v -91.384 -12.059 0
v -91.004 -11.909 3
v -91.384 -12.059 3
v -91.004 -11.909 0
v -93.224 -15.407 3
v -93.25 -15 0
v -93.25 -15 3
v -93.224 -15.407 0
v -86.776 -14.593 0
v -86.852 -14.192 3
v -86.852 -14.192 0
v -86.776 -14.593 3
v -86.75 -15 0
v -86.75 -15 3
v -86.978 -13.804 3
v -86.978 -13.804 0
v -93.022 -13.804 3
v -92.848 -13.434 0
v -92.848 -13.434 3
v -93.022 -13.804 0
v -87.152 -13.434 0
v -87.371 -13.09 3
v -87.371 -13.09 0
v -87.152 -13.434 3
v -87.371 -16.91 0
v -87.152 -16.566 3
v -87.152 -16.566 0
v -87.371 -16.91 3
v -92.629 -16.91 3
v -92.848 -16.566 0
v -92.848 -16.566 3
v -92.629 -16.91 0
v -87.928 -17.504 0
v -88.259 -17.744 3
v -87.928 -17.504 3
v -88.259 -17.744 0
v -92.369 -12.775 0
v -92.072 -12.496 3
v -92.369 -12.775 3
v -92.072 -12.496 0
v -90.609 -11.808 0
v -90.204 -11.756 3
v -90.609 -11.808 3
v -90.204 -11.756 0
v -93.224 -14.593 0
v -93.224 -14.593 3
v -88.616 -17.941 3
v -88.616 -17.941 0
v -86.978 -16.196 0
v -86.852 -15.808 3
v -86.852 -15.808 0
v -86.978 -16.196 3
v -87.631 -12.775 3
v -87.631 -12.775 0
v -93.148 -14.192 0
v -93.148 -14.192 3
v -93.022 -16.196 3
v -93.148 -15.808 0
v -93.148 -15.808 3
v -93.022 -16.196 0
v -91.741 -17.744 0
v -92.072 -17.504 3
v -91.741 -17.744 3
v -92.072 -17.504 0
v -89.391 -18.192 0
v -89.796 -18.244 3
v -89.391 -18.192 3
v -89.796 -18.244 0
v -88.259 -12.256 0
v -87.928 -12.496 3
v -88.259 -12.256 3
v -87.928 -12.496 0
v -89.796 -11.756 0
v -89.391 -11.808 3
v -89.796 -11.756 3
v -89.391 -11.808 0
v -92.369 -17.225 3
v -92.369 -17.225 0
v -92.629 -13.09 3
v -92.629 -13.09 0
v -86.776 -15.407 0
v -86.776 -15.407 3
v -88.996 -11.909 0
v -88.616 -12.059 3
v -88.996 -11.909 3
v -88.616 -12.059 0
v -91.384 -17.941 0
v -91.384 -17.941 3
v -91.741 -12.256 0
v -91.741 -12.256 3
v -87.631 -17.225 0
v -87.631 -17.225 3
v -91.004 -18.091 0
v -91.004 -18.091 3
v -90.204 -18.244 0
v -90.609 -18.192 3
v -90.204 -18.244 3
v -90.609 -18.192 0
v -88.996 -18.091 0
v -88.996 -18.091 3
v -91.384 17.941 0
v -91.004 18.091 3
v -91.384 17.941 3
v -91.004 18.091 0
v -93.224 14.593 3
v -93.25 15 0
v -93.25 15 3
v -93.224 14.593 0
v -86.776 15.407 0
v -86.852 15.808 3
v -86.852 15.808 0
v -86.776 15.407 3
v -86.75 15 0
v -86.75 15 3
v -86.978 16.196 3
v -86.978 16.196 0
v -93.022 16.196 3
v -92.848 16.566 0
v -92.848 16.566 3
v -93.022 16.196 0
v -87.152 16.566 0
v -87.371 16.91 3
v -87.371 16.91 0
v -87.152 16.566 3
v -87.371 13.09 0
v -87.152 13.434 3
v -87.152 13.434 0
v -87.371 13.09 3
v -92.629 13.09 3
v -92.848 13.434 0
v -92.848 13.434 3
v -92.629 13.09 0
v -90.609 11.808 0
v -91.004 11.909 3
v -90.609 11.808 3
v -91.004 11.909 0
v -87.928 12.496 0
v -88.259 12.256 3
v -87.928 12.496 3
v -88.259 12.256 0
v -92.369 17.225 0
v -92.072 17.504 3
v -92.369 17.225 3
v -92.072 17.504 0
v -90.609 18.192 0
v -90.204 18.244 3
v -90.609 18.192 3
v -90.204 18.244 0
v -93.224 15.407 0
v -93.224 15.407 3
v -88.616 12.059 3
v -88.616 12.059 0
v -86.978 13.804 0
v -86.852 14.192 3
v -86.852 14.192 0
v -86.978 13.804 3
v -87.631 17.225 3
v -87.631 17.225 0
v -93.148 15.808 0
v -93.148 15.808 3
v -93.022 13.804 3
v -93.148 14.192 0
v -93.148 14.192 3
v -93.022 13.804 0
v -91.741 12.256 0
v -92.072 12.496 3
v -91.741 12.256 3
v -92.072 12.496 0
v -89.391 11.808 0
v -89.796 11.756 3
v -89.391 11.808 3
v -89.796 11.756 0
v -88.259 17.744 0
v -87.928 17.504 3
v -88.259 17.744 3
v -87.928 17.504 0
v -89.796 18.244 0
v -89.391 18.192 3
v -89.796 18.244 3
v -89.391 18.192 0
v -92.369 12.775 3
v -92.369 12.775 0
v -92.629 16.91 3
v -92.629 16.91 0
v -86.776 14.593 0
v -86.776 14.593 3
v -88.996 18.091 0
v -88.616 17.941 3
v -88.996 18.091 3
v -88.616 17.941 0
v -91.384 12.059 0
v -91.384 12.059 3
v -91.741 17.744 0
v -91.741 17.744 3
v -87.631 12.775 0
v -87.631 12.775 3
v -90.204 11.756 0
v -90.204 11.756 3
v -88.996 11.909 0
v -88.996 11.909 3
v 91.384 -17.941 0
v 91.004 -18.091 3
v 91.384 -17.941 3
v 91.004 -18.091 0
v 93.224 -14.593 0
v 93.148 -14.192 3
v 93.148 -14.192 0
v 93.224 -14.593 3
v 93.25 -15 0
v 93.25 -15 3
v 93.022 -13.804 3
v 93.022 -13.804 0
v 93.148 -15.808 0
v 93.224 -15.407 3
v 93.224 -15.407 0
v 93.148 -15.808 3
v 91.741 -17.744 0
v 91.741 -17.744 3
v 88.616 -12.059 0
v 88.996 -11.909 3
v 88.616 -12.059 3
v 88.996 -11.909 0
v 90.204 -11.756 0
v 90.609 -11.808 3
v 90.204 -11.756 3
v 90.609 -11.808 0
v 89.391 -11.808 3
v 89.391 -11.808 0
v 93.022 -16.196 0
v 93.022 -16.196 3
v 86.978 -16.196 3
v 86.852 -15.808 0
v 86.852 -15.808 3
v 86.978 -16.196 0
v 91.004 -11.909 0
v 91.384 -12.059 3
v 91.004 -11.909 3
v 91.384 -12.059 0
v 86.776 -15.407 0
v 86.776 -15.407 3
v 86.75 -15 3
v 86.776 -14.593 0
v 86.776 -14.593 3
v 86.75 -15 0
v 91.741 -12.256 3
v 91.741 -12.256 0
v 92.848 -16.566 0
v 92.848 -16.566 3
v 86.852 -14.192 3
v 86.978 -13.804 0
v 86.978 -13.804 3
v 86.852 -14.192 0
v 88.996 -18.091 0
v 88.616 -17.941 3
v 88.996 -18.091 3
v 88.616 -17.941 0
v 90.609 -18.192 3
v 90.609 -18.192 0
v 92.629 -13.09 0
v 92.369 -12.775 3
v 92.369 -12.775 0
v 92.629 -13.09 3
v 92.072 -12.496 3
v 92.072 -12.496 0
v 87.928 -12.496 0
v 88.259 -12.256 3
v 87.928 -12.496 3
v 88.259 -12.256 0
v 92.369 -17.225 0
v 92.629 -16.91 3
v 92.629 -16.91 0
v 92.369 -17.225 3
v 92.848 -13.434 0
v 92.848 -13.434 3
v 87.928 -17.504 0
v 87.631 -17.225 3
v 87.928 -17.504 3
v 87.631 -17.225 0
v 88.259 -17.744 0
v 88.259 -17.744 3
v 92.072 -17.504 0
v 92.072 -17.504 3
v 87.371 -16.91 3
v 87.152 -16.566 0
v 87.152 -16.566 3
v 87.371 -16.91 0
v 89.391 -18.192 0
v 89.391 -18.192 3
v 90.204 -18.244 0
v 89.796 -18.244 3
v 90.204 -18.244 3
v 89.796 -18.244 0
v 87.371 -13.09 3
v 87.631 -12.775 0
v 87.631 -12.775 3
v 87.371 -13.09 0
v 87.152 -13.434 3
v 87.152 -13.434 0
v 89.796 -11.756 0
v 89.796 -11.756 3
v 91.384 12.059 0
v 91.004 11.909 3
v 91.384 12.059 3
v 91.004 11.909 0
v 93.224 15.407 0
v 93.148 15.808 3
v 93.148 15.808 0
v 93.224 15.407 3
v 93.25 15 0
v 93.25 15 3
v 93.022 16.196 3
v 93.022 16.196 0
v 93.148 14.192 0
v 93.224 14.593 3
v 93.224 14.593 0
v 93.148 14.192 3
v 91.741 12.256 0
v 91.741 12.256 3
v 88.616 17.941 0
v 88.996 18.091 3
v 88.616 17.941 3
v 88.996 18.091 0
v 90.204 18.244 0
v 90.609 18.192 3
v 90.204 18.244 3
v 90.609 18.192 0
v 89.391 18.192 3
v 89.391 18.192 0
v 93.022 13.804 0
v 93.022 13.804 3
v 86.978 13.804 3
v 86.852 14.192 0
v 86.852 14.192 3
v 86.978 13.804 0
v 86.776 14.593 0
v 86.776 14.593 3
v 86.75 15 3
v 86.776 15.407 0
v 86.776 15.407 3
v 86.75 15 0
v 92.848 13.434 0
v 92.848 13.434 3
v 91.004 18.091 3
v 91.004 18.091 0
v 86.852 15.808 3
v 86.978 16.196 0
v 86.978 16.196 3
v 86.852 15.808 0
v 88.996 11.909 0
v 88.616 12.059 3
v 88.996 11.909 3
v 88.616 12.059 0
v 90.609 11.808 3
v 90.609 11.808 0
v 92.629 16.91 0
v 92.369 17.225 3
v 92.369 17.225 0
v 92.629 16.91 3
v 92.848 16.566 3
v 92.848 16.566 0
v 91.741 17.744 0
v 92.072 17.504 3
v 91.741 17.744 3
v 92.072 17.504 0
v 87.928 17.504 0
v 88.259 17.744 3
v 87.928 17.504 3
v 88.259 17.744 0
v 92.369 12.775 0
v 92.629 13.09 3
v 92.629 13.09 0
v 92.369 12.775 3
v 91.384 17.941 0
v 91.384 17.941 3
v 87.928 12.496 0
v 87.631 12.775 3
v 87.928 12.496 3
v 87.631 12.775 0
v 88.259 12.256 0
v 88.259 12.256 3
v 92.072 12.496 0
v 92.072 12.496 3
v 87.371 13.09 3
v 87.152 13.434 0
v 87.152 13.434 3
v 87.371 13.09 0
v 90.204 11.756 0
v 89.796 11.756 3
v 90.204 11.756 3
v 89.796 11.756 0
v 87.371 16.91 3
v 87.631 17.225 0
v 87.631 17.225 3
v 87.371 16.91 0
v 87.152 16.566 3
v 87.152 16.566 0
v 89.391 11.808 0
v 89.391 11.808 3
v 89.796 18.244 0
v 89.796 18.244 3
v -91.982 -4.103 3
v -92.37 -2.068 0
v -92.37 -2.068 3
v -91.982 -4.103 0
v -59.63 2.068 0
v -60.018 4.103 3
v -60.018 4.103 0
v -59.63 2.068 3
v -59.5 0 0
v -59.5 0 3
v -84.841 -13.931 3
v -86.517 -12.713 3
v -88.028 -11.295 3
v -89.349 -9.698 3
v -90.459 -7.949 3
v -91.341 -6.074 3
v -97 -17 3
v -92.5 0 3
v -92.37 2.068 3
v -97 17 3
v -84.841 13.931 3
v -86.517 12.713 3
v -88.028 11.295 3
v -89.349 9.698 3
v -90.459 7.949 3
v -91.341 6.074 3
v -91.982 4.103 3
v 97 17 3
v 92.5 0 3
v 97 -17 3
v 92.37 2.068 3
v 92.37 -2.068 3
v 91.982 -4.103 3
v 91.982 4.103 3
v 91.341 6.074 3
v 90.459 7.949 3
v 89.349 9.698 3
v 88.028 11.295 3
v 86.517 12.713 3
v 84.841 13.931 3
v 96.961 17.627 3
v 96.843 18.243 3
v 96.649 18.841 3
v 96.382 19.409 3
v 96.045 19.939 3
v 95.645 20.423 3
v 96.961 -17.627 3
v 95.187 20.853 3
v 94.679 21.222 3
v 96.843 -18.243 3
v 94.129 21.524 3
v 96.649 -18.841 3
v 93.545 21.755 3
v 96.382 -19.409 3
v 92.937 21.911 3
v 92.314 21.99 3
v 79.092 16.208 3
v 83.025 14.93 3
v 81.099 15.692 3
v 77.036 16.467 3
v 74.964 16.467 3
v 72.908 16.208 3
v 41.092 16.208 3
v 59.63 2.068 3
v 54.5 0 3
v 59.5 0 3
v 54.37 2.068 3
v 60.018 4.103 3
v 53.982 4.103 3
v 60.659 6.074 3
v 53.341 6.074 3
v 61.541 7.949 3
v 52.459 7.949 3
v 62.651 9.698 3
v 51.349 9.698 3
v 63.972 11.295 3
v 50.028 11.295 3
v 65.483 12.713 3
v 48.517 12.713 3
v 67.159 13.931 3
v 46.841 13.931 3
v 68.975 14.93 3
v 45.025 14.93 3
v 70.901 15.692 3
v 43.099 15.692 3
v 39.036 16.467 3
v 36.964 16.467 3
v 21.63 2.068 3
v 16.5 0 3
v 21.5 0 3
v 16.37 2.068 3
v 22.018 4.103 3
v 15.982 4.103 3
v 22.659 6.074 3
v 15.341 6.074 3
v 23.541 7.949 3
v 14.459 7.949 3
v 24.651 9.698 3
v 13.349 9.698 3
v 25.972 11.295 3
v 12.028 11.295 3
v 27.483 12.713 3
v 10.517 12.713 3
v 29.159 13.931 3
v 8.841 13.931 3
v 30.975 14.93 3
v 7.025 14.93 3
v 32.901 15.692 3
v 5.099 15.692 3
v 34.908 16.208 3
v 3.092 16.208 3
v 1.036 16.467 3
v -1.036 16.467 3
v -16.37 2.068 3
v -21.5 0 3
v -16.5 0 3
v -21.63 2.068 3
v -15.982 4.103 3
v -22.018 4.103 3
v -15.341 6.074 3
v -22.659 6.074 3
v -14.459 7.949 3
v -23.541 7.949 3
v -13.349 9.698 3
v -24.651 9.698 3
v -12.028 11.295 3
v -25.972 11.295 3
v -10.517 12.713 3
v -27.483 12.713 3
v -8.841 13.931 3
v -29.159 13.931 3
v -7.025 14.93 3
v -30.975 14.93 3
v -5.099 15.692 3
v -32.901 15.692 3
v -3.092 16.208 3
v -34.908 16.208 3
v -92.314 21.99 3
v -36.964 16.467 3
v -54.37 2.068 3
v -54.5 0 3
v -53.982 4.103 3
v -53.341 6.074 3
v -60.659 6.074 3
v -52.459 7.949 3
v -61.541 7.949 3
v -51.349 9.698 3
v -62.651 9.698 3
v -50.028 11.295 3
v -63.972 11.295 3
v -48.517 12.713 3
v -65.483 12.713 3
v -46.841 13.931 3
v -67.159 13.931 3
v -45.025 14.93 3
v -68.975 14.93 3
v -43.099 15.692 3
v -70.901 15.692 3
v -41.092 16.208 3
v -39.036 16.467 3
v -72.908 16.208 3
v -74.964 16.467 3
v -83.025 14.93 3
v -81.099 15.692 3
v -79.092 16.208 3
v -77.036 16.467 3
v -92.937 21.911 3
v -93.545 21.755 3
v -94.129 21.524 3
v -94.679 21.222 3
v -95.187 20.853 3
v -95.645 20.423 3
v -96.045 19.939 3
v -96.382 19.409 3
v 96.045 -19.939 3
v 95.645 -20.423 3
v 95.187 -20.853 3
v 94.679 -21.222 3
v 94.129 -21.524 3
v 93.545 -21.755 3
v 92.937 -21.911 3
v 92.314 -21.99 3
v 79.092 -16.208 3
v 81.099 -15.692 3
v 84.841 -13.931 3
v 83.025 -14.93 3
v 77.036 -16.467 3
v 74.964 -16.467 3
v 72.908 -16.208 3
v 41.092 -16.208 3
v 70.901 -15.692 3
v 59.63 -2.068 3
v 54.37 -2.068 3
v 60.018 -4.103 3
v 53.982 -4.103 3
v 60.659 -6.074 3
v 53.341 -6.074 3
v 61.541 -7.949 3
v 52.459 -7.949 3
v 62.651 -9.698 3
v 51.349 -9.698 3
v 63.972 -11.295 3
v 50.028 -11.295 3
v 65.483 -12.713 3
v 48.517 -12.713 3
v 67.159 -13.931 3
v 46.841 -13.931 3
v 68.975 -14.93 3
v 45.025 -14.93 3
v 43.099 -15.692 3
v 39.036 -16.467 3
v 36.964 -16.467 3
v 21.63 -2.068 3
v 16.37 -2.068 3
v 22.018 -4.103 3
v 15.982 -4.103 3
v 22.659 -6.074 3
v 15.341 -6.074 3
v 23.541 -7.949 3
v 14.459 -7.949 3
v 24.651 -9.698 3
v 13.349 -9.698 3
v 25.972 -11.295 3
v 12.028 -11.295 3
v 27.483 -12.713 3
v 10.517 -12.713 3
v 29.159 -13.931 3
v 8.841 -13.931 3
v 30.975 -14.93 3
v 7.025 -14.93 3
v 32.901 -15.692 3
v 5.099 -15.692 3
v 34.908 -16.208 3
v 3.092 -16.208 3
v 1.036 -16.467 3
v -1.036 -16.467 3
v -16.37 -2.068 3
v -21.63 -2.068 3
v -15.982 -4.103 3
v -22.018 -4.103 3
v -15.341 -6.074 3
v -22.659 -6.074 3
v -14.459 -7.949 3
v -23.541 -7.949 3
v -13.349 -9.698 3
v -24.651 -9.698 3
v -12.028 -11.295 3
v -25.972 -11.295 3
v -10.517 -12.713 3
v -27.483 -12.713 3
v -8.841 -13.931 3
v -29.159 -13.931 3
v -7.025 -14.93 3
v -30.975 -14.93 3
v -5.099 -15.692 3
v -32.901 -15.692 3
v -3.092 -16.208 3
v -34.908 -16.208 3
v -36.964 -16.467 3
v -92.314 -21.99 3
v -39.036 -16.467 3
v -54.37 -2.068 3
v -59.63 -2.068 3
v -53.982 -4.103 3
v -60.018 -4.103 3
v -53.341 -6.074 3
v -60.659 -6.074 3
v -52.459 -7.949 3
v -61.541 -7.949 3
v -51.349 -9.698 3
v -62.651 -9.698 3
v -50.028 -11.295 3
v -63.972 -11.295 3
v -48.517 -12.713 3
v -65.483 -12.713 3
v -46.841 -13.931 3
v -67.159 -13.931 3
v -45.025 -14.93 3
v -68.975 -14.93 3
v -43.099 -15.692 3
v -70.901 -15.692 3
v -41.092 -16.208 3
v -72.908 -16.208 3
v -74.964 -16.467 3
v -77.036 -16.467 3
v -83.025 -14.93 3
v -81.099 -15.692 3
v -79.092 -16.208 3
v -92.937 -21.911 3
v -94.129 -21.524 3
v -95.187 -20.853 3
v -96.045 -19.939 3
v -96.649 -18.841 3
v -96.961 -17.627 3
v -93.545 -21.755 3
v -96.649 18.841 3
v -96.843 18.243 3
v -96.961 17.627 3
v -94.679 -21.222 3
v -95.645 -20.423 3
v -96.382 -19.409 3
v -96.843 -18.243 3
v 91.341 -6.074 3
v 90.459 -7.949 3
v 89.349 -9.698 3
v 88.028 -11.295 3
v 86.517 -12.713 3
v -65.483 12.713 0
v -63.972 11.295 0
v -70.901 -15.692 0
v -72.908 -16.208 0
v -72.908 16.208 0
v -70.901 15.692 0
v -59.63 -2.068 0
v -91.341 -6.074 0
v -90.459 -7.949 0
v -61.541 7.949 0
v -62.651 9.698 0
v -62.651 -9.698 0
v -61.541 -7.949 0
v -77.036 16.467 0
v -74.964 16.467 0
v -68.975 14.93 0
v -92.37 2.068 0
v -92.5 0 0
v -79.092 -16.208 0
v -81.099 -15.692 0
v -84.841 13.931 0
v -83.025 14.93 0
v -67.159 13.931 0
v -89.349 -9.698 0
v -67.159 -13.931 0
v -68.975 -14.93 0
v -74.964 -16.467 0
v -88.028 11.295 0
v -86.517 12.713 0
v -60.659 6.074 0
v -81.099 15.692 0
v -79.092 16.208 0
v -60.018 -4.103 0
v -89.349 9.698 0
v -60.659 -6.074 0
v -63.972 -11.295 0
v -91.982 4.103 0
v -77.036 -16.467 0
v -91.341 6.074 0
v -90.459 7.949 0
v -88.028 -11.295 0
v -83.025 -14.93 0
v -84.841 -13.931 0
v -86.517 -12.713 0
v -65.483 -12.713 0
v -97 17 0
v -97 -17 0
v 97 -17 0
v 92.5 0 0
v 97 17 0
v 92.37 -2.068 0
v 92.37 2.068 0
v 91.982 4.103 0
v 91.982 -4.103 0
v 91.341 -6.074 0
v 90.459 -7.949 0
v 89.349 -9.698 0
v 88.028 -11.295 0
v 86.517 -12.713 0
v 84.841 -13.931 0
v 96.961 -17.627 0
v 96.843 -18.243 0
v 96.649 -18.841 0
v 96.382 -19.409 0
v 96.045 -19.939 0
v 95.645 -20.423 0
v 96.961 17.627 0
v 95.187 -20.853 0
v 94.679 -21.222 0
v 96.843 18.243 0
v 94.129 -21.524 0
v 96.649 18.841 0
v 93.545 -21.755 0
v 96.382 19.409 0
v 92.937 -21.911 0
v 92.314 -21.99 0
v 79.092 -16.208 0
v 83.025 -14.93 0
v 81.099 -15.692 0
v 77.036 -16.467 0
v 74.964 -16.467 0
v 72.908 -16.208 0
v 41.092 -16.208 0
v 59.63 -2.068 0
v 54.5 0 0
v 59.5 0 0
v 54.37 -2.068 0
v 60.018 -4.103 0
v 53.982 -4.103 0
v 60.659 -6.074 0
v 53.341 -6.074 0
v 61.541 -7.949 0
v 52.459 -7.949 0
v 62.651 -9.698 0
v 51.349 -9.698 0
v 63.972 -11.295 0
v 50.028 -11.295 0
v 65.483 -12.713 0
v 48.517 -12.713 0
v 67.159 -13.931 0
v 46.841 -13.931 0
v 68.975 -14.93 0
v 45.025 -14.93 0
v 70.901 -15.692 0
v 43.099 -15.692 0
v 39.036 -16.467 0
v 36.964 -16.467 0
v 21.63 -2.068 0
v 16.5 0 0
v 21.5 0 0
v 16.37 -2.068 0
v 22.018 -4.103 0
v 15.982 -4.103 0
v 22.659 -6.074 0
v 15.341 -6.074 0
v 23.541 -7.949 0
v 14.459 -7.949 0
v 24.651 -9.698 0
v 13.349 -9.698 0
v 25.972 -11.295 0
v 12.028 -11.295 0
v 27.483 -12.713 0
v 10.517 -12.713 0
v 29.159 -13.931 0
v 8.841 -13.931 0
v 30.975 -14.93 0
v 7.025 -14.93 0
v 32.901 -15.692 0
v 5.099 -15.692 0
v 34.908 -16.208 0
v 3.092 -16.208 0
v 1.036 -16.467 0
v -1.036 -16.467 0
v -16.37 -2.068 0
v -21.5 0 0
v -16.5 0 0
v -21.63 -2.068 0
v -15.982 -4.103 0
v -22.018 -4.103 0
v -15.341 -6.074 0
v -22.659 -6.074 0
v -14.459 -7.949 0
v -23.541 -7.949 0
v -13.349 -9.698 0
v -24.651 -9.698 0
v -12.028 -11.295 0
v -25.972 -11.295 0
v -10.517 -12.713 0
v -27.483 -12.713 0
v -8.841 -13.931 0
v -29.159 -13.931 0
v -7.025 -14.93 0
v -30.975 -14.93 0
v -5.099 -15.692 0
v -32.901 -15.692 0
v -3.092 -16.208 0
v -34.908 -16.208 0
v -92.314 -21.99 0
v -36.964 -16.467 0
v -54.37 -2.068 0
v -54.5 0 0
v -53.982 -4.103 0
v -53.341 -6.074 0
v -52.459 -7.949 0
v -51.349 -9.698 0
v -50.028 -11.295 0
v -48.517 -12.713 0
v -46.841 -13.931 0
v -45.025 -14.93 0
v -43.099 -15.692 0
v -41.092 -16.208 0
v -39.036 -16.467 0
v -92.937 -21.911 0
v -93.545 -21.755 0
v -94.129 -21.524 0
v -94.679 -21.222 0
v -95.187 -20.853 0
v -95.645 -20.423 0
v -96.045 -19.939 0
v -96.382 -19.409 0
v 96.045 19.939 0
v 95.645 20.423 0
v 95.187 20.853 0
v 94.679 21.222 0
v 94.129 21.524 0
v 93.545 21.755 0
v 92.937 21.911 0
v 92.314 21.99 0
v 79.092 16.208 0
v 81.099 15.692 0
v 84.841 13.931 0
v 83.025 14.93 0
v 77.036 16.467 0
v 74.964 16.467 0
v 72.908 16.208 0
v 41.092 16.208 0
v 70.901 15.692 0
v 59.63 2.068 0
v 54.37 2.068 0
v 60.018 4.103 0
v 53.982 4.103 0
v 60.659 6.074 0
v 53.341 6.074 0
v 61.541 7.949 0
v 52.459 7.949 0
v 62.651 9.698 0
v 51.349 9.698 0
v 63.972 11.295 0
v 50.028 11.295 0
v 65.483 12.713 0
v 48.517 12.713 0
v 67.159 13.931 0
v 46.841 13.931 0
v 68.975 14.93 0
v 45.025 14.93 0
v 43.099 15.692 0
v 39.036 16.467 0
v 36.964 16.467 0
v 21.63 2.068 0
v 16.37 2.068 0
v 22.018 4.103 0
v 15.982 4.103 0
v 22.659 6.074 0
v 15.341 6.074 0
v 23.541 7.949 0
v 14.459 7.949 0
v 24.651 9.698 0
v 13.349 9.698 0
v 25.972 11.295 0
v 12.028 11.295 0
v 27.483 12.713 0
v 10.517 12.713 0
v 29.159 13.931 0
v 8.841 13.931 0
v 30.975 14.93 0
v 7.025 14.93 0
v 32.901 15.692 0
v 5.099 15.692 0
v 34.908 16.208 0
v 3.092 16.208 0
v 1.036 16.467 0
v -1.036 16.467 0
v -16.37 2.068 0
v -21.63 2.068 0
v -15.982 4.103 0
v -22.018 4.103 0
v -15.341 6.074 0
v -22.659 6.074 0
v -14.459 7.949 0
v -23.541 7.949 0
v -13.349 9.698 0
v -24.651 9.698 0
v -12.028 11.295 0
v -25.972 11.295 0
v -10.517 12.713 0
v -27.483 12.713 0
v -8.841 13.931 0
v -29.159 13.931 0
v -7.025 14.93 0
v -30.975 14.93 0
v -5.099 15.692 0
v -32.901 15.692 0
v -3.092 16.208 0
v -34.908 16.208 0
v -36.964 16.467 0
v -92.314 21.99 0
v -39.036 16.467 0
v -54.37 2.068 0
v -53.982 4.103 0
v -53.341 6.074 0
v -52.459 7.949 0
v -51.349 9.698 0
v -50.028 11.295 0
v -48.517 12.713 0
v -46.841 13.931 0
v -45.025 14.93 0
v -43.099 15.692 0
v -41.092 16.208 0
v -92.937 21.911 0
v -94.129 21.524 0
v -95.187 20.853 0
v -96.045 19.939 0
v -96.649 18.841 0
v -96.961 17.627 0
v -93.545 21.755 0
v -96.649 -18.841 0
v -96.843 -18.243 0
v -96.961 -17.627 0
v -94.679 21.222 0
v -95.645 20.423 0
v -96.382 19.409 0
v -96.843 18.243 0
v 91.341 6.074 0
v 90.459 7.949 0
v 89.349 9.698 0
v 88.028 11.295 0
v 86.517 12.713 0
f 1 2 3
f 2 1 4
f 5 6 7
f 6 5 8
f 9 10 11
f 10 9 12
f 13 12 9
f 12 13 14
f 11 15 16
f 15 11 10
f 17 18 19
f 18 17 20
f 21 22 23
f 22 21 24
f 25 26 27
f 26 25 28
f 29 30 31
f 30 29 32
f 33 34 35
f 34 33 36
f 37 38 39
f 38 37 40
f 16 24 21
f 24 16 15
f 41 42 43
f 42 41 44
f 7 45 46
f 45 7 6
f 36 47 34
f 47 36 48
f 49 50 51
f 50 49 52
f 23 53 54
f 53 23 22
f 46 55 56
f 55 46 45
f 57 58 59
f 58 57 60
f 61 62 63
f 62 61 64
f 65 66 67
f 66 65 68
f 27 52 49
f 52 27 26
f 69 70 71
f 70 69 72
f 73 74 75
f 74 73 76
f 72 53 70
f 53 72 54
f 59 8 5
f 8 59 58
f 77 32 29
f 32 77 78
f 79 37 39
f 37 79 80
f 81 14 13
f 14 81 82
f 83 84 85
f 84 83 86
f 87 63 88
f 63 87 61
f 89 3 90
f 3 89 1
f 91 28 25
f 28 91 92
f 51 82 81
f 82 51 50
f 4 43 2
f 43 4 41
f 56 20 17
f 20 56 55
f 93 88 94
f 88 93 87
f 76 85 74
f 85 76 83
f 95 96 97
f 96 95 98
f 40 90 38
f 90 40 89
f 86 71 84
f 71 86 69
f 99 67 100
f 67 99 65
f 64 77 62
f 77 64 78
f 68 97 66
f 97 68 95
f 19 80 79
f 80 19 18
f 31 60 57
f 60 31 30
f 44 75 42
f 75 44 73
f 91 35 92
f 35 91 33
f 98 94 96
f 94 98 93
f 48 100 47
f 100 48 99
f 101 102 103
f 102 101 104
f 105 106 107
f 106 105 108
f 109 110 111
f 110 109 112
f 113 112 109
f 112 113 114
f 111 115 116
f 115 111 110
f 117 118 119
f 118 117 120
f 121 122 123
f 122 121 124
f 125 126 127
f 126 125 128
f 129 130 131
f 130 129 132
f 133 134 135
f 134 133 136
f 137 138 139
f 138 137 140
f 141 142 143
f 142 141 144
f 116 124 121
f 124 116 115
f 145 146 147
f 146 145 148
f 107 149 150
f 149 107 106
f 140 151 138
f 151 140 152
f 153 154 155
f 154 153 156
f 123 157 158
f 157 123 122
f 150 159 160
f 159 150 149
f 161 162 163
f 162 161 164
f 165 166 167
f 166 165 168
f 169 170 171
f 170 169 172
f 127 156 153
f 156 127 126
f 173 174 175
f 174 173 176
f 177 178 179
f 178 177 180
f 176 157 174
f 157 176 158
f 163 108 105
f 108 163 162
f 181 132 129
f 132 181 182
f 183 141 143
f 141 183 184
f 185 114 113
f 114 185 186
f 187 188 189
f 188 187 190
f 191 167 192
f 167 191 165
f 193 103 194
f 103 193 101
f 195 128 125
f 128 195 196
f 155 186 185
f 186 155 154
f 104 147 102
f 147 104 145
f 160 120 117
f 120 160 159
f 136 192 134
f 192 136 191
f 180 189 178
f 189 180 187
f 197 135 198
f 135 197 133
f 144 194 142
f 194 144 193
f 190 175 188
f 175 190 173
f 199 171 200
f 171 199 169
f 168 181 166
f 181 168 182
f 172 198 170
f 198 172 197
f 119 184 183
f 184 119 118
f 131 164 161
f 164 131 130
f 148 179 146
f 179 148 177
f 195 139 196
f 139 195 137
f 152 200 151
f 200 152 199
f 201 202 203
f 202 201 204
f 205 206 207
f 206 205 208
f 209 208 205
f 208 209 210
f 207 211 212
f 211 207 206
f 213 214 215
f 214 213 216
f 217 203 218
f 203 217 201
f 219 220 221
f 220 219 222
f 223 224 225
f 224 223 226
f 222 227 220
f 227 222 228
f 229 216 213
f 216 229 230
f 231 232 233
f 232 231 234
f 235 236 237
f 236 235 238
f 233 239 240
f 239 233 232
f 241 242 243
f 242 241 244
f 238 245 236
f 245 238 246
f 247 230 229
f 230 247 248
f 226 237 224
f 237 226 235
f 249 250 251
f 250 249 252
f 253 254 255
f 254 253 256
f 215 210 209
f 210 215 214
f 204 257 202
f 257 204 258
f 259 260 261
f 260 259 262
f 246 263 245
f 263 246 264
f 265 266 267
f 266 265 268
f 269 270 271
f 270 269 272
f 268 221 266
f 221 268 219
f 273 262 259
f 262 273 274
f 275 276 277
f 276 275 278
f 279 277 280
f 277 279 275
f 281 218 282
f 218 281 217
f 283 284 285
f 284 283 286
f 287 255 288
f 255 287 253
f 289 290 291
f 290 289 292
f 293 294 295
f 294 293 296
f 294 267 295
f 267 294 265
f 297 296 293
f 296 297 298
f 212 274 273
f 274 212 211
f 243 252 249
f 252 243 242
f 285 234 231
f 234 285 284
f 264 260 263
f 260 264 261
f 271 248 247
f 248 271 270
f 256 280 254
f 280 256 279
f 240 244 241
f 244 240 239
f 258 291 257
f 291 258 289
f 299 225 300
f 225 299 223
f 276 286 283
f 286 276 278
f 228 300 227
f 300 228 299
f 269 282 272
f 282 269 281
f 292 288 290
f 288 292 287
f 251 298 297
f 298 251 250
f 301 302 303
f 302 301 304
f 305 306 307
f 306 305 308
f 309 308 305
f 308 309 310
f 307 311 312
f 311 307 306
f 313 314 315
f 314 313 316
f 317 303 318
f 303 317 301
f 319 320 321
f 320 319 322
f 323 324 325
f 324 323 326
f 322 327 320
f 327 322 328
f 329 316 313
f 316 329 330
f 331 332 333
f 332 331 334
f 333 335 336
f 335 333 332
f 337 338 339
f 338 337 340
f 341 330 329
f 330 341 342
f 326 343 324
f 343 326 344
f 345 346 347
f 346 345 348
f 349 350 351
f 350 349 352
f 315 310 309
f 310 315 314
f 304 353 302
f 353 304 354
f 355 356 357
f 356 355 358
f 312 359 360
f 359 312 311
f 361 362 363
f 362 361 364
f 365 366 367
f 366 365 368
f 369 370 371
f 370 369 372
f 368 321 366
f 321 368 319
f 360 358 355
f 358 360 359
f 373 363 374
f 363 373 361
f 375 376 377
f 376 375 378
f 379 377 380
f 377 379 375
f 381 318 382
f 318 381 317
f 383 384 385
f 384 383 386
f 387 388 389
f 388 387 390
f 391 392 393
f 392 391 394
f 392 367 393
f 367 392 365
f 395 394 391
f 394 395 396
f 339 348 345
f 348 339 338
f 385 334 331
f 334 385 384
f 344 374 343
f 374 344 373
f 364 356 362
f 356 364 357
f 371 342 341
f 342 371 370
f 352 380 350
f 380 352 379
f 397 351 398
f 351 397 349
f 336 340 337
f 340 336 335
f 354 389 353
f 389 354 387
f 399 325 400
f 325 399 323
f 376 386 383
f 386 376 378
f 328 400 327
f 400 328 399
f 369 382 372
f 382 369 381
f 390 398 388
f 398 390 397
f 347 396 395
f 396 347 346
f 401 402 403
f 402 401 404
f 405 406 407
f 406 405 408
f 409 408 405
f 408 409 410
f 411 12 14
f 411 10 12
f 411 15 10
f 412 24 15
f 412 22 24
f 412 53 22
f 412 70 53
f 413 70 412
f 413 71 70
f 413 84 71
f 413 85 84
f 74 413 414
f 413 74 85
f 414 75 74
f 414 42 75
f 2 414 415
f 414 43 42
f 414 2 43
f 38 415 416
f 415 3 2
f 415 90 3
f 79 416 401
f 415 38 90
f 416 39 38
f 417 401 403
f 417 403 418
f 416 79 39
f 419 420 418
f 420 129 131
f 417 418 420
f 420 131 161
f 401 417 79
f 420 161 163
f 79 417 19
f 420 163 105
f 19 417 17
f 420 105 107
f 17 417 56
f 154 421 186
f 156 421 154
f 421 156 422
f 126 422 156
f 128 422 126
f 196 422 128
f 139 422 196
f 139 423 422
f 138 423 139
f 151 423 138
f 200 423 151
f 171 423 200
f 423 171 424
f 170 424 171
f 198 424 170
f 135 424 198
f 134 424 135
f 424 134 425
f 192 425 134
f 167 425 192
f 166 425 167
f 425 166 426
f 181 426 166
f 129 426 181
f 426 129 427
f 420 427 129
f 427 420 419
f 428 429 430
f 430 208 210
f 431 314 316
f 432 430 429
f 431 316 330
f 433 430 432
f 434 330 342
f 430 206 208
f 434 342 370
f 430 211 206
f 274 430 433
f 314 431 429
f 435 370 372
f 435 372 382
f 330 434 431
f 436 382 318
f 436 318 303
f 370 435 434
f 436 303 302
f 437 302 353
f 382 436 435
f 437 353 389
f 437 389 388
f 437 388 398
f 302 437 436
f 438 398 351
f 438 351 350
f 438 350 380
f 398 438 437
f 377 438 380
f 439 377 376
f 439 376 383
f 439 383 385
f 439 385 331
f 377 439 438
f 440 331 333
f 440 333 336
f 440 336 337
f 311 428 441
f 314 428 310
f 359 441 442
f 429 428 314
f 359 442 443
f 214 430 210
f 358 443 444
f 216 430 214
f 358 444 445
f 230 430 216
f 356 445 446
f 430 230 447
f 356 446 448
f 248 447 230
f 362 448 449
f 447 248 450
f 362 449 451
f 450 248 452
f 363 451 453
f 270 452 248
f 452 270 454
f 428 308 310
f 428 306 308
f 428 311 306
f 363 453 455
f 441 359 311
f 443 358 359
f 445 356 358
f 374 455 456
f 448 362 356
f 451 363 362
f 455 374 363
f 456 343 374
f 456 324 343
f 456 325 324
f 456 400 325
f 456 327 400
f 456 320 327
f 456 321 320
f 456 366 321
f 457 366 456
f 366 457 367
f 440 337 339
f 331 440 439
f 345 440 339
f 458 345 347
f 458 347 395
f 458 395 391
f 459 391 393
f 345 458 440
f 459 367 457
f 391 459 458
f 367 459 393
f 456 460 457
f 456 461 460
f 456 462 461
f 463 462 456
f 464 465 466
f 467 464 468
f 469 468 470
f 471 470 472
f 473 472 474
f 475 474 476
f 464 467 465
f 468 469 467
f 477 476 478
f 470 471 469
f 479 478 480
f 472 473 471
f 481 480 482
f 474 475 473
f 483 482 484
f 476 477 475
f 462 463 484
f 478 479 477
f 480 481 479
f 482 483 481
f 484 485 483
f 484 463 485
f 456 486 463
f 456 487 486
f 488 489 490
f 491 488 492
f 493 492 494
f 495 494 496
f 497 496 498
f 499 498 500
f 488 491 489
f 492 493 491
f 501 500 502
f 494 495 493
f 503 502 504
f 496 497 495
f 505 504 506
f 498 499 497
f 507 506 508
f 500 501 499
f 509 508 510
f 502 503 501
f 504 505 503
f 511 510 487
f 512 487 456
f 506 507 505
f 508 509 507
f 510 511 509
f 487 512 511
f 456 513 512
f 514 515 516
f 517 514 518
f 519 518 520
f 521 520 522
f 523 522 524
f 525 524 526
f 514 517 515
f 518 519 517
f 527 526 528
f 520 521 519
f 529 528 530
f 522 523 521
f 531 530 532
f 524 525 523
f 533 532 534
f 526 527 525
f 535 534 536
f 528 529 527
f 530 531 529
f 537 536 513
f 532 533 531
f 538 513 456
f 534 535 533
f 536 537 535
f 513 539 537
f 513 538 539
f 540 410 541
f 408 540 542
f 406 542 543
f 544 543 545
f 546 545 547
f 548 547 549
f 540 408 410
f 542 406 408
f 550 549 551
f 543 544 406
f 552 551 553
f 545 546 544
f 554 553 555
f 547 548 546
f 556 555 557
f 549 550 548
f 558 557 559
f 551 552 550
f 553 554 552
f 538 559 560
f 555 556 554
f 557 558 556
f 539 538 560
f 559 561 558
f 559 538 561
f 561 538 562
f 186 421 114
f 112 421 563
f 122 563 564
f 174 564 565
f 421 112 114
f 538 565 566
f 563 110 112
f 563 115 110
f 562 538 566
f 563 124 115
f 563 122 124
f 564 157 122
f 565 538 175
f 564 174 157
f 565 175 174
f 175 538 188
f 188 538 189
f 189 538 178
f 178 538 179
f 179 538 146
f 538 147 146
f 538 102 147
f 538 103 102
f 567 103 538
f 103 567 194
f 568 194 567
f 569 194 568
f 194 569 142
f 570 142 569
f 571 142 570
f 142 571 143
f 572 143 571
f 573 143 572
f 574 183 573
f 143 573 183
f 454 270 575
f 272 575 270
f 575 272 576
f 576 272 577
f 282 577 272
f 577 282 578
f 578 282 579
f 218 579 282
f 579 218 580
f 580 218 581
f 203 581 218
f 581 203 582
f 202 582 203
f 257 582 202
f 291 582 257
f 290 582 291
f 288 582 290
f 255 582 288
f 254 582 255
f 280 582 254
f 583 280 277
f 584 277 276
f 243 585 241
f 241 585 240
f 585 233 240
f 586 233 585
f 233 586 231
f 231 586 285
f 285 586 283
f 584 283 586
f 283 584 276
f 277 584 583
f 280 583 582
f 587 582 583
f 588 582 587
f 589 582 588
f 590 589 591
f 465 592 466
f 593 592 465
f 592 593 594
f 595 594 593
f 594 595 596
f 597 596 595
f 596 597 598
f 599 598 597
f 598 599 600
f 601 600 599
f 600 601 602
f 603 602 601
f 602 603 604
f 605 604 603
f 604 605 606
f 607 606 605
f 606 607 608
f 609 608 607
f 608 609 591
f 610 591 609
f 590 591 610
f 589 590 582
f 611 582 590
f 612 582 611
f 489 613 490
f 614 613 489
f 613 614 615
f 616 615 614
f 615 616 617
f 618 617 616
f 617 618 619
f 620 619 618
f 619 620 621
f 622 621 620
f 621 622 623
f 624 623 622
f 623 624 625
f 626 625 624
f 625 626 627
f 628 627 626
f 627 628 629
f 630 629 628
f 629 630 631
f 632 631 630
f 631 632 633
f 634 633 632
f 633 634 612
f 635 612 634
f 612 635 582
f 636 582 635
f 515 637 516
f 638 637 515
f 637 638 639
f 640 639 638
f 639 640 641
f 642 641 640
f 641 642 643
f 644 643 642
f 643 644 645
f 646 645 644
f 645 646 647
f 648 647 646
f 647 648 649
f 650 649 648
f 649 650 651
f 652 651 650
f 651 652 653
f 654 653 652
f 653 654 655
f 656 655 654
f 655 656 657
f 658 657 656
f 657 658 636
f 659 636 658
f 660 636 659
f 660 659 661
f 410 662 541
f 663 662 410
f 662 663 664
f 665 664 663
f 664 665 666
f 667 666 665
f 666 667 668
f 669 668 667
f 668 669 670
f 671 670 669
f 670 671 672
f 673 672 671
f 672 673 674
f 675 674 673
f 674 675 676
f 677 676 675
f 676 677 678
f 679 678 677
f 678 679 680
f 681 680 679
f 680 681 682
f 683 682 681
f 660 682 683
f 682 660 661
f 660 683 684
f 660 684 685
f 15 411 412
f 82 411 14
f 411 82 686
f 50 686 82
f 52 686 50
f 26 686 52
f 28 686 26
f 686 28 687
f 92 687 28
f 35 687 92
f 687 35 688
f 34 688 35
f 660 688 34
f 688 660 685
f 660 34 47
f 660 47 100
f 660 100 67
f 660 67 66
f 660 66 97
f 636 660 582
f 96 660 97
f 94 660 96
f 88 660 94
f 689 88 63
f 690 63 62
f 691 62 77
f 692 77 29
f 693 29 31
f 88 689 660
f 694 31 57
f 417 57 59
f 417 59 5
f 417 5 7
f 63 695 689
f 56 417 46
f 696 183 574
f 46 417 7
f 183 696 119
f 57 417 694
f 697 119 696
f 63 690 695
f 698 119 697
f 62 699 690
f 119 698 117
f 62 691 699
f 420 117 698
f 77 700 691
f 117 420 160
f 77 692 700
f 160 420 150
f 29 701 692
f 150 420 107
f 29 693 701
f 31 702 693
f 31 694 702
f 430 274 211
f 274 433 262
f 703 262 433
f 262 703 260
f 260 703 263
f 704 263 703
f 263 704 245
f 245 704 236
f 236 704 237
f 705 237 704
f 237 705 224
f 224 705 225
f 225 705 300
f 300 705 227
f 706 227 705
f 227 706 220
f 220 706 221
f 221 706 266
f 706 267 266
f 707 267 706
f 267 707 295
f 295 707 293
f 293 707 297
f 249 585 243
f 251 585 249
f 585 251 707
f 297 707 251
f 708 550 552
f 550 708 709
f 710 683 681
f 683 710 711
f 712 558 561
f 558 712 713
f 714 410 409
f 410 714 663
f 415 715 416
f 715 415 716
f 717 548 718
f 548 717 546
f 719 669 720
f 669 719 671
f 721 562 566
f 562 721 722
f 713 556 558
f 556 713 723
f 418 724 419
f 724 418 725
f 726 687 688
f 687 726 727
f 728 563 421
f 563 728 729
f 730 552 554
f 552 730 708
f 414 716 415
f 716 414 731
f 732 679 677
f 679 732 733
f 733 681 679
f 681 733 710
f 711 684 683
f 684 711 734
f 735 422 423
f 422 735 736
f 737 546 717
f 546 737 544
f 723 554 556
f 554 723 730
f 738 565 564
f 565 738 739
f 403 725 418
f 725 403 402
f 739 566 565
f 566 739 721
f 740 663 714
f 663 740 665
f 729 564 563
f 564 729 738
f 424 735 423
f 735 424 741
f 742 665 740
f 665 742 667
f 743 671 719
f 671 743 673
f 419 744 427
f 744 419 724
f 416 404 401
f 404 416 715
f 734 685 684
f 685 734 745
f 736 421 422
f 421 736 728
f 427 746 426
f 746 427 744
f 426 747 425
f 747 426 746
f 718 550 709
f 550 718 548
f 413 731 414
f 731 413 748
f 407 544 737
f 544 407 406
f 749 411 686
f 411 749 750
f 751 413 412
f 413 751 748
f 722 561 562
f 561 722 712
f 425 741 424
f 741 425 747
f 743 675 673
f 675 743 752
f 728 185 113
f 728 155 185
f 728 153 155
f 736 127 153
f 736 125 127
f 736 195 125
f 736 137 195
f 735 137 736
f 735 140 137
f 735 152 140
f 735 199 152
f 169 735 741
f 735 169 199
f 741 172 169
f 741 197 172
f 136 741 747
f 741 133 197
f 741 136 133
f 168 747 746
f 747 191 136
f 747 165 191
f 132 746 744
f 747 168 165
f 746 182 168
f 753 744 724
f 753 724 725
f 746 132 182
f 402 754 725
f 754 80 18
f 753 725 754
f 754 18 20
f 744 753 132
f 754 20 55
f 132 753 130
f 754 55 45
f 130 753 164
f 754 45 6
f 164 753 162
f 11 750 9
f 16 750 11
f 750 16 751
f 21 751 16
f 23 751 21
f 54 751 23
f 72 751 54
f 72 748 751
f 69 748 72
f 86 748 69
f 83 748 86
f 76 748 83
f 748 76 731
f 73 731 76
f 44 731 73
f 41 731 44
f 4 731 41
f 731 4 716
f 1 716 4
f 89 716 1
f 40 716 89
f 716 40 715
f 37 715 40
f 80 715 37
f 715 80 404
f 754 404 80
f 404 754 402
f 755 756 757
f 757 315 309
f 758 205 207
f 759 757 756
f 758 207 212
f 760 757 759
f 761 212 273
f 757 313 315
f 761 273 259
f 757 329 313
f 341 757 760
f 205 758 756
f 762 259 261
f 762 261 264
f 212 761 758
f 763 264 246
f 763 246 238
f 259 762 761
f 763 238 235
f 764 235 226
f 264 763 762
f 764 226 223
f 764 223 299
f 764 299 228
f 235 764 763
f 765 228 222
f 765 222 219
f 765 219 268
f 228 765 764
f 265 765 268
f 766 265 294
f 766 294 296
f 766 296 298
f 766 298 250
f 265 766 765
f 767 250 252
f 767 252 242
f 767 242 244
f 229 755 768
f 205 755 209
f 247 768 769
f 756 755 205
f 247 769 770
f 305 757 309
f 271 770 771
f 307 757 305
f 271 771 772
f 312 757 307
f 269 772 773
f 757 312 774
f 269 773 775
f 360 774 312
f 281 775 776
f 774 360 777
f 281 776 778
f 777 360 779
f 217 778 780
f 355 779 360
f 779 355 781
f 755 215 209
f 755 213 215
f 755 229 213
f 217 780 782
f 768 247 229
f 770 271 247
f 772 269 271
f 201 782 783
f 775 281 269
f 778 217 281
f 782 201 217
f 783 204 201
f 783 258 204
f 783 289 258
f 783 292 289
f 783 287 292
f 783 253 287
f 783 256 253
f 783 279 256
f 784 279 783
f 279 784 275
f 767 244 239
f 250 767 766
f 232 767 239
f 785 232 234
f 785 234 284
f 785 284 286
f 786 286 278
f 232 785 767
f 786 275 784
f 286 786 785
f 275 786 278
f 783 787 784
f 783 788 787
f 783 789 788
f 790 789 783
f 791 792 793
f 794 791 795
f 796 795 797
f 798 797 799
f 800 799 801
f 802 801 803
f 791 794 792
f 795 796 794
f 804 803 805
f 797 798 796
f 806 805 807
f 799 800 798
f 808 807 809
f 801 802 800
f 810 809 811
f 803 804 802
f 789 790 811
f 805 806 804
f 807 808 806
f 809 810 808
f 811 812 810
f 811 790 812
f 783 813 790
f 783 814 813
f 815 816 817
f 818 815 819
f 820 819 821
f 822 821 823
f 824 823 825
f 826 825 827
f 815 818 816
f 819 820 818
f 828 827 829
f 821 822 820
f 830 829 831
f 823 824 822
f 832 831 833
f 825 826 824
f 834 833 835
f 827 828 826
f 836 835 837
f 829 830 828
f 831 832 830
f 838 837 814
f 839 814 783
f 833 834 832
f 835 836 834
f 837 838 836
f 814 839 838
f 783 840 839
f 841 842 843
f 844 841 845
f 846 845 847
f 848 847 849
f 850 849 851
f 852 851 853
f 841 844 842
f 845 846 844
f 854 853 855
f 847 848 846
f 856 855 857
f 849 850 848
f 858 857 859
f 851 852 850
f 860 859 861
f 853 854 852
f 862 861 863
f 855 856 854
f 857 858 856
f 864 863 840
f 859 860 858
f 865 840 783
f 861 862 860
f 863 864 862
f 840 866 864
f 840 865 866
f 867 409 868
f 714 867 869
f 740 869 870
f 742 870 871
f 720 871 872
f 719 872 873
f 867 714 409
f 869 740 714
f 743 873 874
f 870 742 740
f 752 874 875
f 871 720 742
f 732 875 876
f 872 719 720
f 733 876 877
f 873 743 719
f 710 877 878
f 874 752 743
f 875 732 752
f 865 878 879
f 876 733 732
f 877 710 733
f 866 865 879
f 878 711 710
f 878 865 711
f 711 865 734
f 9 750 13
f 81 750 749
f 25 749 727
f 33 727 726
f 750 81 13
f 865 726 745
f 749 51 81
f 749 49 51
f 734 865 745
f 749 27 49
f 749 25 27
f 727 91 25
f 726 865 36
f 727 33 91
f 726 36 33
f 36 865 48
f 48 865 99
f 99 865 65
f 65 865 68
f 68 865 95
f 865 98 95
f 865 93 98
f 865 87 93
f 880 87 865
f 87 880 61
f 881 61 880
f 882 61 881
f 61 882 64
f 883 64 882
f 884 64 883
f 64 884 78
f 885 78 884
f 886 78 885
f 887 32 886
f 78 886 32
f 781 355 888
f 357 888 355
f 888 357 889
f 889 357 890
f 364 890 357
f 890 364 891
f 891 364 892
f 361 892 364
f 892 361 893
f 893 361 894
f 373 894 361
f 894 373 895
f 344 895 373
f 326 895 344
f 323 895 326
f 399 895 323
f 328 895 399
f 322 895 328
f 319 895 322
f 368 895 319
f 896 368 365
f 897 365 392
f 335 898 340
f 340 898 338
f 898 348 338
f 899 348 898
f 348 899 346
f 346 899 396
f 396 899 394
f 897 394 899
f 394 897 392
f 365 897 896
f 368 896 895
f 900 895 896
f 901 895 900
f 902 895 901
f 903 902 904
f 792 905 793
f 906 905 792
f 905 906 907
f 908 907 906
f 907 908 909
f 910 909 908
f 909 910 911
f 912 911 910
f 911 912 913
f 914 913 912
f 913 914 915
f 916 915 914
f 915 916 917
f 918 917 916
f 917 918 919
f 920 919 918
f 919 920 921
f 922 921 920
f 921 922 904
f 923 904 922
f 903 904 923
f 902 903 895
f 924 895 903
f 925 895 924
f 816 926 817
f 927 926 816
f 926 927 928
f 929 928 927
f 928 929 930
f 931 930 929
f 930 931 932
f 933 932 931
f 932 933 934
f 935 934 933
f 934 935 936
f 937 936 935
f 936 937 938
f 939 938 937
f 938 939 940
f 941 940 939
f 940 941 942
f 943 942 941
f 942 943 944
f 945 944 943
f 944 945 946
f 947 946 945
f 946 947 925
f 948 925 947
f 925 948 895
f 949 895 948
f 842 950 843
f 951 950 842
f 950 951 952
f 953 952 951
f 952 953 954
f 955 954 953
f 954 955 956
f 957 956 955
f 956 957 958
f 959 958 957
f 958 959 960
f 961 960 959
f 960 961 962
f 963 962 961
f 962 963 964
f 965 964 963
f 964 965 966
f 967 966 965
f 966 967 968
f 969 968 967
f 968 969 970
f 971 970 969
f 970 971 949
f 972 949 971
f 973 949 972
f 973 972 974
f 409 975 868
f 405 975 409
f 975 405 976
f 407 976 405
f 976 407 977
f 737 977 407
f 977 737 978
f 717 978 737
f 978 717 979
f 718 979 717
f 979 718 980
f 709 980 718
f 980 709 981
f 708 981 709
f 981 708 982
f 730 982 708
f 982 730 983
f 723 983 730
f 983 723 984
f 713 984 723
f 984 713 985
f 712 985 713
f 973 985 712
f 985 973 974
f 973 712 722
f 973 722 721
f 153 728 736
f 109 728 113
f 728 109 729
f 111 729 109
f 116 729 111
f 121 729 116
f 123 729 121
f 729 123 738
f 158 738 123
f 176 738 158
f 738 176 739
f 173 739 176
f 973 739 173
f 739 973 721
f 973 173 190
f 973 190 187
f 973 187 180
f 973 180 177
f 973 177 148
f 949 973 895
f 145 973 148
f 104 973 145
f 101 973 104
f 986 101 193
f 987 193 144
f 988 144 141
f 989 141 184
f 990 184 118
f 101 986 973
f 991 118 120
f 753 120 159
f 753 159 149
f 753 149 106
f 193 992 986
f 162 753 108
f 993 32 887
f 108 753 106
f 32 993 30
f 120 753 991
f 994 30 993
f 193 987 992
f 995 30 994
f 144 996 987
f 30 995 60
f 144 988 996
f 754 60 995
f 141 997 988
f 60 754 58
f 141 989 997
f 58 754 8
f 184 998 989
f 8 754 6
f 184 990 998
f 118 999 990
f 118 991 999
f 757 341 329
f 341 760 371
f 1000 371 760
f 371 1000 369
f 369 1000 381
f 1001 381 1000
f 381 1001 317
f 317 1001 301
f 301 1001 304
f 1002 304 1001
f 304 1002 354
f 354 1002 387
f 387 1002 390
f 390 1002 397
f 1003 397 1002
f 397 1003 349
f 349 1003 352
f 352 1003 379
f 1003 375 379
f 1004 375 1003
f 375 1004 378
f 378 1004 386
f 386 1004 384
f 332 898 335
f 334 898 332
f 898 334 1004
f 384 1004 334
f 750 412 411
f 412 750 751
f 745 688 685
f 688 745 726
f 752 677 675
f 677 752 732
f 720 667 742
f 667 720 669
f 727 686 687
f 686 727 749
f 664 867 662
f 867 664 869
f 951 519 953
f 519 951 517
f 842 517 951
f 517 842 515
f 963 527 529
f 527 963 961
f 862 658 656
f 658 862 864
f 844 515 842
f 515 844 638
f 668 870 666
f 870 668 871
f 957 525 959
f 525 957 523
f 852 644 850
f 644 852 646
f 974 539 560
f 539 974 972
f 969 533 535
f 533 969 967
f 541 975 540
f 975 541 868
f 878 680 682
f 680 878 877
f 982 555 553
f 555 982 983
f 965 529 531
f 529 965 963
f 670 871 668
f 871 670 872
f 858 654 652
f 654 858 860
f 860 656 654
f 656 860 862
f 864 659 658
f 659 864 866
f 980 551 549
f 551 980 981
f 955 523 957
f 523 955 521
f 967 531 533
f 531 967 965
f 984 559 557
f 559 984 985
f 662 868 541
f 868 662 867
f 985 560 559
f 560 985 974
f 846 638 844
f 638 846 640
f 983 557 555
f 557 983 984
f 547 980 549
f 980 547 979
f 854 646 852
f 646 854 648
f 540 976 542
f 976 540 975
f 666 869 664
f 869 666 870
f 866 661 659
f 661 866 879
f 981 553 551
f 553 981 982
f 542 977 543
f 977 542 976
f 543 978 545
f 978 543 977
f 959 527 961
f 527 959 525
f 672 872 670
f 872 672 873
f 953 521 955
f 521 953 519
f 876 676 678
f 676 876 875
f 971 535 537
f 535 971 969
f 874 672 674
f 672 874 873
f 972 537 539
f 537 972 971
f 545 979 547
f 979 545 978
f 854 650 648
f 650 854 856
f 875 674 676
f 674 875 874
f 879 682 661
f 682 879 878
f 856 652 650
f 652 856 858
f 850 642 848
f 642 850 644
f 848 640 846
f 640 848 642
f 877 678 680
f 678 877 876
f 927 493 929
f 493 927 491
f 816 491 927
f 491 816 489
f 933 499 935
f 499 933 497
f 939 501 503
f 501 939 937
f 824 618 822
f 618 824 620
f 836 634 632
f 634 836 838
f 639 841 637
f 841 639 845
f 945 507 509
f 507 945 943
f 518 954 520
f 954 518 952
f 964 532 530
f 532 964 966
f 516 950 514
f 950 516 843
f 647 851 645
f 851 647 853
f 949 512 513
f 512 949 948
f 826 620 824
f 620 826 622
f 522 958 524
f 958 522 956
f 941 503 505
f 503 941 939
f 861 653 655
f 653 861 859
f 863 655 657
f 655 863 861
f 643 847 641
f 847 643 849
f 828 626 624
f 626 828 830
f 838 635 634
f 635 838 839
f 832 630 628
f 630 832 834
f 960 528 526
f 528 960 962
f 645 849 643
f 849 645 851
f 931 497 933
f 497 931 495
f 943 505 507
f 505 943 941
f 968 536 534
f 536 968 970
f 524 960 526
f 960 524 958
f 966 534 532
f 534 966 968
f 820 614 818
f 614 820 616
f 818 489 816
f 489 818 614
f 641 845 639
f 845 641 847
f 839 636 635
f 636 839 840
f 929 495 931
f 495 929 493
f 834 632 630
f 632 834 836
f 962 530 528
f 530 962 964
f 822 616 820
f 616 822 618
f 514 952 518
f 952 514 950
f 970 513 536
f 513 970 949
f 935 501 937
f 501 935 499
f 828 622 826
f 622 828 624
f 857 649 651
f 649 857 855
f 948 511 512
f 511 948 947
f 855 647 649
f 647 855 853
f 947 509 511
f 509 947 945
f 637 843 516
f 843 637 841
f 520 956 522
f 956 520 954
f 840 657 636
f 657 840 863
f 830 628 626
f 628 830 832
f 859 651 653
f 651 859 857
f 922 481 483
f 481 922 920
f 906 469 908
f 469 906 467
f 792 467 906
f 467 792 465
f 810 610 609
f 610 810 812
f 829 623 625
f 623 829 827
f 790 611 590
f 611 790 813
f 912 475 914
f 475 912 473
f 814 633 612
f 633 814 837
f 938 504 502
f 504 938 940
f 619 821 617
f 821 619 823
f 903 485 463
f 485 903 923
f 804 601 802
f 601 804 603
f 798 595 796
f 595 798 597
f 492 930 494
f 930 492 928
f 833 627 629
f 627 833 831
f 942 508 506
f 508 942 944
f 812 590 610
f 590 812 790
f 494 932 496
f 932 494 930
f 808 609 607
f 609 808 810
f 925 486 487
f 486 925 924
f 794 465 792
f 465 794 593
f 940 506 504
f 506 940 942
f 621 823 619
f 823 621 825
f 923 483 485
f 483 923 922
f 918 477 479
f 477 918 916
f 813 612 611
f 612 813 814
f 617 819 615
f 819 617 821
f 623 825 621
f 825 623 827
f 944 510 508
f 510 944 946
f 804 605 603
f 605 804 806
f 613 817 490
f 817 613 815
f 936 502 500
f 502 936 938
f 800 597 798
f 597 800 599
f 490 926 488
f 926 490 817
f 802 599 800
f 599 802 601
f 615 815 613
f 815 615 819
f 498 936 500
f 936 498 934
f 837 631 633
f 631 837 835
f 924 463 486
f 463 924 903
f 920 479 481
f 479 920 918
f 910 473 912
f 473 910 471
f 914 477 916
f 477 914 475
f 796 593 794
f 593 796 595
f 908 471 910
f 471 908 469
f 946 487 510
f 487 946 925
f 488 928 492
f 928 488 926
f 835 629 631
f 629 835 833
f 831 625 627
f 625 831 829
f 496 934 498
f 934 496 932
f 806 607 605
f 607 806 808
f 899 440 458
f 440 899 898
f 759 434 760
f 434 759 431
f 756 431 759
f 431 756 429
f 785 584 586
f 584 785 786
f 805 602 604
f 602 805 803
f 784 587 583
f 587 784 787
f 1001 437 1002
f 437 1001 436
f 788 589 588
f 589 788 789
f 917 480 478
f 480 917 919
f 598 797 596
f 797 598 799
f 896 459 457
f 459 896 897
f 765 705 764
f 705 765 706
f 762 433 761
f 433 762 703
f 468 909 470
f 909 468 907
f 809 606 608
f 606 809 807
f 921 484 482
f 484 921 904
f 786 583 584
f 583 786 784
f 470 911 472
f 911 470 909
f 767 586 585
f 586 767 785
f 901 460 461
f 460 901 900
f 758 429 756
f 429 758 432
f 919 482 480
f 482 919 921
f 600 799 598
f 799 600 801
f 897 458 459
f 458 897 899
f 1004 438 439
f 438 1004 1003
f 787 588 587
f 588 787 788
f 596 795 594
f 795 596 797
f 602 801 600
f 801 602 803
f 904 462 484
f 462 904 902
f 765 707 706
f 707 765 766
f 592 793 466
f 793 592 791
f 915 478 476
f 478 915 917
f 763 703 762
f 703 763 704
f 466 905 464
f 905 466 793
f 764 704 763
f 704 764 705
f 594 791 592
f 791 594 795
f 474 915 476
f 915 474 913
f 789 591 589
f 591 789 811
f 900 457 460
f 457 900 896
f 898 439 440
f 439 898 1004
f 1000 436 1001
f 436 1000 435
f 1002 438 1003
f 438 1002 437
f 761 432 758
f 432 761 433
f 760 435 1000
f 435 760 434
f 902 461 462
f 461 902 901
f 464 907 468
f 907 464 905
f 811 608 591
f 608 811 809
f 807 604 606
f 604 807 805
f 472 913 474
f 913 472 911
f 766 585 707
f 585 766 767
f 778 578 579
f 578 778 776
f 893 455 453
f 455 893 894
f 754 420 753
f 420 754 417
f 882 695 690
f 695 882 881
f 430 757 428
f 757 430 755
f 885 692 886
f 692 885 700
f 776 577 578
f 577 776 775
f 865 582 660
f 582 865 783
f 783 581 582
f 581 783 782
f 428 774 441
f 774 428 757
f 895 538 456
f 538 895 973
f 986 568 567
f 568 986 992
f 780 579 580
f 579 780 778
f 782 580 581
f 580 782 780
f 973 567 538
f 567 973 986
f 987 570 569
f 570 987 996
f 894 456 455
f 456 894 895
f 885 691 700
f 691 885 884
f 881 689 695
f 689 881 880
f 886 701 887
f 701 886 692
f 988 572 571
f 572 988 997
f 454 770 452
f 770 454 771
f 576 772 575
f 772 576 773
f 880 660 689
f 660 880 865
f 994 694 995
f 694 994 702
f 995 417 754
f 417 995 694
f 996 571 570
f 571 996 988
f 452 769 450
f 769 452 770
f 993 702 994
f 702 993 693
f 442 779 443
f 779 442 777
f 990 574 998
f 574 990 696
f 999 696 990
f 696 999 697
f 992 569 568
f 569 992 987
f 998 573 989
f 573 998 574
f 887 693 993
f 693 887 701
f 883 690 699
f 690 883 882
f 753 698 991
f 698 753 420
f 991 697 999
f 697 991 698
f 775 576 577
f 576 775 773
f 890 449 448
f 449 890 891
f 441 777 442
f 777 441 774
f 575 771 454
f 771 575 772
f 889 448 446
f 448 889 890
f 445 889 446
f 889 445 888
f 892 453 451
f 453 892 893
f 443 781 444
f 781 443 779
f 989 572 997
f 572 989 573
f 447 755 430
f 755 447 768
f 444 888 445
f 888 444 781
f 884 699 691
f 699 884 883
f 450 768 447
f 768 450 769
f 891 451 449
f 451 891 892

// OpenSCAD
$fn = 50;


difference() {
	union() {
		hull() {
			translate(v = [-92.0000000000, 17.0000000000, 0]) {
				cylinder(h = 3, r = 5);
			}
			translate(v = [92.0000000000, 17.0000000000, 0]) {
				cylinder(h = 3, r = 5);
			}
			translate(v = [-92.0000000000, -17.0000000000, 0]) {
				cylinder(h = 3, r = 5);
			}
			translate(v = [92.0000000000, -17.0000000000, 0]) {
				cylinder(h = 3, r = 5);
			}
		}
	}
	union() {
		#translate(v = [-90.0000000000, -15.0000000000, -100.0000000000]) {
			cylinder(h = 200, r = 3.2500000000);
		}
		#translate(v = [-90.0000000000, 15.0000000000, -100.0000000000]) {
			cylinder(h = 200, r = 3.2500000000);
		}
		#translate(v = [90.0000000000, -15.0000000000, -100.0000000000]) {
			cylinder(h = 200, r = 3.2500000000);
		}
		#translate(v = [90.0000000000, 15.0000000000, -100.0000000000]) {
			cylinder(h = 200, r = 3.2500000000);
		}
		#translate(v = [-76.0000000000, 0, 0]) {
			cylinder(h = 3, r = 16.5000000000);
		}
		#translate(v = [-38.0000000000, 0, 0]) {
			cylinder(h = 3, r = 16.5000000000);
		}
		#cylinder(h = 3, r = 16.5000000000);
		#translate(v = [38.0000000000, 0, 0]) {
			cylinder(h = 3, r = 16.5000000000);
		}
		#translate(v = [76.0000000000, 0, 0]) {
			cylinder(h = 3, r = 16.5000000000);
		}
	}
}
